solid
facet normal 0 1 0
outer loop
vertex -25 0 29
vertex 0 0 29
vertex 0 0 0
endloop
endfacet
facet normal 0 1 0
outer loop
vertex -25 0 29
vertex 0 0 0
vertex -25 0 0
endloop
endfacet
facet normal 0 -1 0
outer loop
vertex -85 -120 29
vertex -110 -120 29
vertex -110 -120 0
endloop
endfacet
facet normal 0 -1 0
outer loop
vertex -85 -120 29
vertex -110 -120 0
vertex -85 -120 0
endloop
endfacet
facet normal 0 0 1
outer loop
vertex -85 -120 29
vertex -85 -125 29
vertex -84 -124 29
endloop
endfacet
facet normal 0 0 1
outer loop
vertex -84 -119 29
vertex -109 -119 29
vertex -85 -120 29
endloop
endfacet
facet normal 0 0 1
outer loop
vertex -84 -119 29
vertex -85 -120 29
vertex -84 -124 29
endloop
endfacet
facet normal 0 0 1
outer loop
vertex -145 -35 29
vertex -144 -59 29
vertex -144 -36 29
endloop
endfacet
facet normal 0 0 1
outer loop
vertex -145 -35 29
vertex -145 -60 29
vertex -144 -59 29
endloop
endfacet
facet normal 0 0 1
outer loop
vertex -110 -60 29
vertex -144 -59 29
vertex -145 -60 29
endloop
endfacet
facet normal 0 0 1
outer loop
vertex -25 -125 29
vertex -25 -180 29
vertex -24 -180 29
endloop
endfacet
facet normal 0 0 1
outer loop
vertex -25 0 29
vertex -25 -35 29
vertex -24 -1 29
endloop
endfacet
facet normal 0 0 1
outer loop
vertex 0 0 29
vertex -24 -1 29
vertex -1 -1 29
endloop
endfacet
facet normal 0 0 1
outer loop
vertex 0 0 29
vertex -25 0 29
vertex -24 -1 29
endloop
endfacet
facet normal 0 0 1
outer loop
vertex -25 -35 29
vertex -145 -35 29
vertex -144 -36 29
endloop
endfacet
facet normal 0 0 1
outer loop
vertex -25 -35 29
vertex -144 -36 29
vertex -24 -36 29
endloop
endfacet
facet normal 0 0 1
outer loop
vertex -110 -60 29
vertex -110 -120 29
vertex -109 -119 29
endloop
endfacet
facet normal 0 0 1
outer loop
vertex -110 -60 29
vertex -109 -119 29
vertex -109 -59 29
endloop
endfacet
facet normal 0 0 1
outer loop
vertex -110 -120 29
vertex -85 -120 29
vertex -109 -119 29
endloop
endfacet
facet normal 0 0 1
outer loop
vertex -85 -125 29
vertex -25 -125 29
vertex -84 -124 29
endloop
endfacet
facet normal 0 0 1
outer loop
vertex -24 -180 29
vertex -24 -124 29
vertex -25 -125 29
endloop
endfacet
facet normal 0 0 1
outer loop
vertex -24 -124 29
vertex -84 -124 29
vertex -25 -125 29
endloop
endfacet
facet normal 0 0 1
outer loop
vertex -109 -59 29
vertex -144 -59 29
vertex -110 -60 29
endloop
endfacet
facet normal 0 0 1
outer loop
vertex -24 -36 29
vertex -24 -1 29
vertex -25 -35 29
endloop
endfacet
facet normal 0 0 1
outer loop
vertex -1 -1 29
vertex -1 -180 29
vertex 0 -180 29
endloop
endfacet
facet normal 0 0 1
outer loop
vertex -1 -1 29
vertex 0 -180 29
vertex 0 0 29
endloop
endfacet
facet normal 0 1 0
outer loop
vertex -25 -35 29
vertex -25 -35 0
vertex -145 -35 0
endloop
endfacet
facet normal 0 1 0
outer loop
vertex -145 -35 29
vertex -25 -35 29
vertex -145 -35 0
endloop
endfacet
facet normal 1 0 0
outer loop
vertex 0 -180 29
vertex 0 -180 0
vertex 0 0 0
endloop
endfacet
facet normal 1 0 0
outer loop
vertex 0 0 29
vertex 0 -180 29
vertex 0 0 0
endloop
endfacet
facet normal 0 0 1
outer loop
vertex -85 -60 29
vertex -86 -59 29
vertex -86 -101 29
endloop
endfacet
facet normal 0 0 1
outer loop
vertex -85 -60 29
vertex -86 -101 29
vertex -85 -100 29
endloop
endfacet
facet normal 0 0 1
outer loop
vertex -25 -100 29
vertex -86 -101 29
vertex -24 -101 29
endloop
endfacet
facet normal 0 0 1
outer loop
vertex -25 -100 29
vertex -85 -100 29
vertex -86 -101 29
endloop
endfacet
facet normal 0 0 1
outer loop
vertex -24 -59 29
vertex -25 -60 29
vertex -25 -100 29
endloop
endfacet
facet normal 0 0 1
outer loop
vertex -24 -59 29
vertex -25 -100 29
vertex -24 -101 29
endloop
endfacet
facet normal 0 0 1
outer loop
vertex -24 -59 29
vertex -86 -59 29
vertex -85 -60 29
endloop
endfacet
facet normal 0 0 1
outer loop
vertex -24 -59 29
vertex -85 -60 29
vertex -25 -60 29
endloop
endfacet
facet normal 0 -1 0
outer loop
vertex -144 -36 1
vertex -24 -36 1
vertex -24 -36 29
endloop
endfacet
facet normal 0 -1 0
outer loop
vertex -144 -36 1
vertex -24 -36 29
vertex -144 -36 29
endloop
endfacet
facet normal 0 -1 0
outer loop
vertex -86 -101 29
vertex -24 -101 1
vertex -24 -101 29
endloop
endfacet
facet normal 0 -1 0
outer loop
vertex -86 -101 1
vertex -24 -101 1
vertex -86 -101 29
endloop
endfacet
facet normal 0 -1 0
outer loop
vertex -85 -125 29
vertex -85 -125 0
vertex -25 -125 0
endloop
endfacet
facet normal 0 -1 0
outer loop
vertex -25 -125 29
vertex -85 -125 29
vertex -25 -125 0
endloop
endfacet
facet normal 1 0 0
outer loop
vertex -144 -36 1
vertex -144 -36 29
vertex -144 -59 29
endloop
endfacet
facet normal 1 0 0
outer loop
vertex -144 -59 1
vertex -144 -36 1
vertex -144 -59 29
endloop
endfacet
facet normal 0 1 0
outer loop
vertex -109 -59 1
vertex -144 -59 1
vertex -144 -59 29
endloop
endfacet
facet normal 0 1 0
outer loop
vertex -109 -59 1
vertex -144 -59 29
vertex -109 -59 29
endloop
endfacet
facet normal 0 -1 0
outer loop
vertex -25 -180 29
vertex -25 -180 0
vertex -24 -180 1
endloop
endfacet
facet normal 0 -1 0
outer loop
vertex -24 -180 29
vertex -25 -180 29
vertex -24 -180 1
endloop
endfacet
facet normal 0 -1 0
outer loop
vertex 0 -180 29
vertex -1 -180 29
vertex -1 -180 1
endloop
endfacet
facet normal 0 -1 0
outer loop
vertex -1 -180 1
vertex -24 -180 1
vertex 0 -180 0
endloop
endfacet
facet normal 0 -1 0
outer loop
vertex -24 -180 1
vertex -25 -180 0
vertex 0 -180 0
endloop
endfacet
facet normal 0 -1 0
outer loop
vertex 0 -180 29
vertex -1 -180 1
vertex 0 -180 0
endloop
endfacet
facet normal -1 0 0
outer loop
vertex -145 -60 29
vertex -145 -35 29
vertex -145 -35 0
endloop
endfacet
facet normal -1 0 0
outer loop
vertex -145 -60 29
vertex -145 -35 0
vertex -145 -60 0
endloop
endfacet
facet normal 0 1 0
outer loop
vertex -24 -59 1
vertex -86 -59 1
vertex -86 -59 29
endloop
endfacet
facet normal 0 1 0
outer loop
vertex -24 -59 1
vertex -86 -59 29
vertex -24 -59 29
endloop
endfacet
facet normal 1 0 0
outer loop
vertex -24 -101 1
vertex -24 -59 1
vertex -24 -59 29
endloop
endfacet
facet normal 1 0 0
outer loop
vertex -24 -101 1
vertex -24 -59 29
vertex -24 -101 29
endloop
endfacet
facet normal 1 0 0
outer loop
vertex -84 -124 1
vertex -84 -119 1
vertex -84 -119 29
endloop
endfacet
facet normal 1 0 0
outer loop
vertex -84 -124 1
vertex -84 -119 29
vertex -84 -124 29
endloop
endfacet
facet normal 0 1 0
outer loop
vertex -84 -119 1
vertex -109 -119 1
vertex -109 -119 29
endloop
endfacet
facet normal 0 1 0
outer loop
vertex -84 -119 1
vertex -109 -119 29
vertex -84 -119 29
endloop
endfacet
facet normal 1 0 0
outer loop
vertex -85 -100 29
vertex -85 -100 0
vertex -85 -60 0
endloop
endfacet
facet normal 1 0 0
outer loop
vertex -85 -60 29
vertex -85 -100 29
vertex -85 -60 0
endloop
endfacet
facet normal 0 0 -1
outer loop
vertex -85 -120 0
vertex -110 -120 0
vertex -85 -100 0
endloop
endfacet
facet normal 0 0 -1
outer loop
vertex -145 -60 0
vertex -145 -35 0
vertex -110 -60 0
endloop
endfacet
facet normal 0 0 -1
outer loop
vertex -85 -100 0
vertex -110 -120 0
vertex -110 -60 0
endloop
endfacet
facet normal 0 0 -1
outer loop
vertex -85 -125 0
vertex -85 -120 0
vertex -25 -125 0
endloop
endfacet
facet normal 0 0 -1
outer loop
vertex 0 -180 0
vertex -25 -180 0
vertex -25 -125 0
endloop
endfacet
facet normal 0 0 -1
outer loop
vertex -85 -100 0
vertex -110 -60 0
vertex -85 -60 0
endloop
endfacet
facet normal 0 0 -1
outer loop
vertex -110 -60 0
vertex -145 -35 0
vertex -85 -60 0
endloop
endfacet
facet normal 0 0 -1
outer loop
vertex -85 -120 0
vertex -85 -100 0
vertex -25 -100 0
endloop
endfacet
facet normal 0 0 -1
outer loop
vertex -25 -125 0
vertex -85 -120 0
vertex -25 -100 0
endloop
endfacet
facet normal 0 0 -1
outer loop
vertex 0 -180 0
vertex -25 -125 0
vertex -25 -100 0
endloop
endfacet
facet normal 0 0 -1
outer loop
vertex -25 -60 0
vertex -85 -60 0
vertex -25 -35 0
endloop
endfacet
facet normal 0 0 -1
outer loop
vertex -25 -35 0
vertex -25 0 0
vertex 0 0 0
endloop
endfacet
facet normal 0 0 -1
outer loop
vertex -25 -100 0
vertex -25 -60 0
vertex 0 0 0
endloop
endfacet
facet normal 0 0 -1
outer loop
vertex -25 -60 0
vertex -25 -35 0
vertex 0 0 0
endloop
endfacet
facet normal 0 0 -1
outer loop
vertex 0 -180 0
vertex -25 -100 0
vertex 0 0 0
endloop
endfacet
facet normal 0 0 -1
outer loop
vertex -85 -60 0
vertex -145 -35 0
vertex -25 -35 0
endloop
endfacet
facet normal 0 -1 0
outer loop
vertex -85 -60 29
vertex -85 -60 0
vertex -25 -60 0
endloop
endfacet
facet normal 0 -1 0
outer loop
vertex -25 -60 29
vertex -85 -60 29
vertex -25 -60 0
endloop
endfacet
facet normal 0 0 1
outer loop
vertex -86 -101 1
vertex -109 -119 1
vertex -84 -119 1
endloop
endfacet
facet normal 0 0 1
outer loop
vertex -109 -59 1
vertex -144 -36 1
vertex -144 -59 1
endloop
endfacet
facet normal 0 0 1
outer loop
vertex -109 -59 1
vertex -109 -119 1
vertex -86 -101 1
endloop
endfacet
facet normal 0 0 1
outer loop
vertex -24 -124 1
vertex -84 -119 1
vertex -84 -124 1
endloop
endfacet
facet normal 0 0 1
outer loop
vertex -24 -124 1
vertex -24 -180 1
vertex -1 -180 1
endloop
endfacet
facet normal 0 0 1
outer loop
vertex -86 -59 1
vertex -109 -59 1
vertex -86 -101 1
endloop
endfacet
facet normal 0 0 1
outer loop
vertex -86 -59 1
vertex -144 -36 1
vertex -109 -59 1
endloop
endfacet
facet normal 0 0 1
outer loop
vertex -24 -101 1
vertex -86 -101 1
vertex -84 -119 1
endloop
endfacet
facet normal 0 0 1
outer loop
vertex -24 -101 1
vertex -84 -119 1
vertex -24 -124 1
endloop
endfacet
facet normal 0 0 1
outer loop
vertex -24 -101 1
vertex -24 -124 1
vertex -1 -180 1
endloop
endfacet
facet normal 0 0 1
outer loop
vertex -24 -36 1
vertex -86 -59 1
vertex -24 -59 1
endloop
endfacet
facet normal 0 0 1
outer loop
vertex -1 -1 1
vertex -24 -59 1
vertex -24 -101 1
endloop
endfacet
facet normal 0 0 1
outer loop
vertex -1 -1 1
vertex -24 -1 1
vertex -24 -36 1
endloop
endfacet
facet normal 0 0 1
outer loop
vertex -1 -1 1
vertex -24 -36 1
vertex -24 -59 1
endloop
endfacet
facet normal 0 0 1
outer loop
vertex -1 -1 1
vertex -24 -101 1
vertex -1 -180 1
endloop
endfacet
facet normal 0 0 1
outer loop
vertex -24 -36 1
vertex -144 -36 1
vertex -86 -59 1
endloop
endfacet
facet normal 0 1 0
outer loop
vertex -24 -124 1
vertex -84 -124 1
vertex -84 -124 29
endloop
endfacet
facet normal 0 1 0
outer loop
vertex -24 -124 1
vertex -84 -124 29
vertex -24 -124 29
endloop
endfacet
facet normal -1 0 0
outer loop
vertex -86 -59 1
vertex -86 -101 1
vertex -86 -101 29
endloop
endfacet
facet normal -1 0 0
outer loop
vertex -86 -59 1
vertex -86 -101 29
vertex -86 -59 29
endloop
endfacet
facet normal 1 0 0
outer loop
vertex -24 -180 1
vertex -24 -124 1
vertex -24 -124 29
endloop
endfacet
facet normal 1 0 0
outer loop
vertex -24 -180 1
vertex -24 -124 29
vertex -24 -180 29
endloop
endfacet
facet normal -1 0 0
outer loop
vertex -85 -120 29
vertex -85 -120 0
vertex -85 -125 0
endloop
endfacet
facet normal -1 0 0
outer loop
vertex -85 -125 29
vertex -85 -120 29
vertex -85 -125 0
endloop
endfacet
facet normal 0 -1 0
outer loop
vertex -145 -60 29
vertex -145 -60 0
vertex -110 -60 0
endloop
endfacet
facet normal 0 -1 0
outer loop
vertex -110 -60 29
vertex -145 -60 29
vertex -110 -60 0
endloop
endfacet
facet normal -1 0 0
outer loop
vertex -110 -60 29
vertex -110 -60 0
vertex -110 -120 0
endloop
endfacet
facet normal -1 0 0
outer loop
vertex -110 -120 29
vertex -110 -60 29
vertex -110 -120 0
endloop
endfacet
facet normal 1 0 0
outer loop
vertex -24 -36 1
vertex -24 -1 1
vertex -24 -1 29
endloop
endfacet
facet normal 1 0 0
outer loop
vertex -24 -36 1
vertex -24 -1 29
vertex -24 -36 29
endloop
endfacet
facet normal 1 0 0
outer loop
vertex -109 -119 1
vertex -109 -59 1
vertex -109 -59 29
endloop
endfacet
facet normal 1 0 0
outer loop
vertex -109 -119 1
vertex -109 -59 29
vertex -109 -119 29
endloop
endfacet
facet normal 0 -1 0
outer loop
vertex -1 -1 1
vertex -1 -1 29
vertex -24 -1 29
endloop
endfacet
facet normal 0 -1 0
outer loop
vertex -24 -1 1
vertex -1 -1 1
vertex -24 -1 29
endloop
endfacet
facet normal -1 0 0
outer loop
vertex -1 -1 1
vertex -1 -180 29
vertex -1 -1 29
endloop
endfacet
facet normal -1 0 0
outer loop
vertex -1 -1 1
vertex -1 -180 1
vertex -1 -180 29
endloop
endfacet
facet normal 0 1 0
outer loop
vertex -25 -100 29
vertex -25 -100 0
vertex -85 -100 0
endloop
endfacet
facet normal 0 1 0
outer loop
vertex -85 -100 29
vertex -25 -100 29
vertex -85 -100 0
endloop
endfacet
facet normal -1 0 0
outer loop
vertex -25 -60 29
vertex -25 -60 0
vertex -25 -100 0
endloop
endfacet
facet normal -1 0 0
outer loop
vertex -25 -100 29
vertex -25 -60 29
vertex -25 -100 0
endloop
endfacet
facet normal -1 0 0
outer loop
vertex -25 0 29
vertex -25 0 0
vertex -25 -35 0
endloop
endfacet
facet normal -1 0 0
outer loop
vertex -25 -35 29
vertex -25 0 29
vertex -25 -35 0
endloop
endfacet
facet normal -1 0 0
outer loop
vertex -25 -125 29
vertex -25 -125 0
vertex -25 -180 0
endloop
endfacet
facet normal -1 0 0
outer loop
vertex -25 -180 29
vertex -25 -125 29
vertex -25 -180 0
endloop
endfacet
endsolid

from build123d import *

# Parameters (mm, degrees)
F1_DEPTH = 30
F2_T     = -1
F3_DEPTH = 1


with BuildPart() as f1:
    # F0 (on Top) → F1 (new body)
    with BuildSketch(Plane.XY):
        Polygon((0, -120), (0, 0), (-25, 0), (-25, -35), (-25, -60), (-25, -100), (-25, -120), align=None)
        Polygon((0, -180), (0, -120), (-25, -120), (-25, -125), (-25, -180), align=None)
        Polygon((-25, -60), (-25, -35), (-145, -35), (-145, -60), (-110, -60), (-85, -60), align=None)
        Polygon((-25, -125), (-25, -120), (-25, -100), (-85, -100), (-85, -120), (-85, -125), align=None)
        Polygon((-85, -100), (-85, -60), (-110, -60), (-110, -120), (-85, -120), align=None)
    extrude(amount=F1_DEPTH)

    # F2
    f2_openings = [f1.faces().sort_by_distance(p)[0] for p in [
        (-12.5, -180, 15),
    ]]
    offset(amount=F2_T, openings=f2_openings, kind=Kind.INTERSECTION)

    # F3 (cut): a face of the model
    f3_faces = [f1.faces().sort_by_distance(p)[0] for p in [
        (-12.5, -2.3113848663, 30),
    ]]
    extrude(f3_faces, amount=-F3_DEPTH, mode=Mode.SUBTRACT)


solid = f1.part
